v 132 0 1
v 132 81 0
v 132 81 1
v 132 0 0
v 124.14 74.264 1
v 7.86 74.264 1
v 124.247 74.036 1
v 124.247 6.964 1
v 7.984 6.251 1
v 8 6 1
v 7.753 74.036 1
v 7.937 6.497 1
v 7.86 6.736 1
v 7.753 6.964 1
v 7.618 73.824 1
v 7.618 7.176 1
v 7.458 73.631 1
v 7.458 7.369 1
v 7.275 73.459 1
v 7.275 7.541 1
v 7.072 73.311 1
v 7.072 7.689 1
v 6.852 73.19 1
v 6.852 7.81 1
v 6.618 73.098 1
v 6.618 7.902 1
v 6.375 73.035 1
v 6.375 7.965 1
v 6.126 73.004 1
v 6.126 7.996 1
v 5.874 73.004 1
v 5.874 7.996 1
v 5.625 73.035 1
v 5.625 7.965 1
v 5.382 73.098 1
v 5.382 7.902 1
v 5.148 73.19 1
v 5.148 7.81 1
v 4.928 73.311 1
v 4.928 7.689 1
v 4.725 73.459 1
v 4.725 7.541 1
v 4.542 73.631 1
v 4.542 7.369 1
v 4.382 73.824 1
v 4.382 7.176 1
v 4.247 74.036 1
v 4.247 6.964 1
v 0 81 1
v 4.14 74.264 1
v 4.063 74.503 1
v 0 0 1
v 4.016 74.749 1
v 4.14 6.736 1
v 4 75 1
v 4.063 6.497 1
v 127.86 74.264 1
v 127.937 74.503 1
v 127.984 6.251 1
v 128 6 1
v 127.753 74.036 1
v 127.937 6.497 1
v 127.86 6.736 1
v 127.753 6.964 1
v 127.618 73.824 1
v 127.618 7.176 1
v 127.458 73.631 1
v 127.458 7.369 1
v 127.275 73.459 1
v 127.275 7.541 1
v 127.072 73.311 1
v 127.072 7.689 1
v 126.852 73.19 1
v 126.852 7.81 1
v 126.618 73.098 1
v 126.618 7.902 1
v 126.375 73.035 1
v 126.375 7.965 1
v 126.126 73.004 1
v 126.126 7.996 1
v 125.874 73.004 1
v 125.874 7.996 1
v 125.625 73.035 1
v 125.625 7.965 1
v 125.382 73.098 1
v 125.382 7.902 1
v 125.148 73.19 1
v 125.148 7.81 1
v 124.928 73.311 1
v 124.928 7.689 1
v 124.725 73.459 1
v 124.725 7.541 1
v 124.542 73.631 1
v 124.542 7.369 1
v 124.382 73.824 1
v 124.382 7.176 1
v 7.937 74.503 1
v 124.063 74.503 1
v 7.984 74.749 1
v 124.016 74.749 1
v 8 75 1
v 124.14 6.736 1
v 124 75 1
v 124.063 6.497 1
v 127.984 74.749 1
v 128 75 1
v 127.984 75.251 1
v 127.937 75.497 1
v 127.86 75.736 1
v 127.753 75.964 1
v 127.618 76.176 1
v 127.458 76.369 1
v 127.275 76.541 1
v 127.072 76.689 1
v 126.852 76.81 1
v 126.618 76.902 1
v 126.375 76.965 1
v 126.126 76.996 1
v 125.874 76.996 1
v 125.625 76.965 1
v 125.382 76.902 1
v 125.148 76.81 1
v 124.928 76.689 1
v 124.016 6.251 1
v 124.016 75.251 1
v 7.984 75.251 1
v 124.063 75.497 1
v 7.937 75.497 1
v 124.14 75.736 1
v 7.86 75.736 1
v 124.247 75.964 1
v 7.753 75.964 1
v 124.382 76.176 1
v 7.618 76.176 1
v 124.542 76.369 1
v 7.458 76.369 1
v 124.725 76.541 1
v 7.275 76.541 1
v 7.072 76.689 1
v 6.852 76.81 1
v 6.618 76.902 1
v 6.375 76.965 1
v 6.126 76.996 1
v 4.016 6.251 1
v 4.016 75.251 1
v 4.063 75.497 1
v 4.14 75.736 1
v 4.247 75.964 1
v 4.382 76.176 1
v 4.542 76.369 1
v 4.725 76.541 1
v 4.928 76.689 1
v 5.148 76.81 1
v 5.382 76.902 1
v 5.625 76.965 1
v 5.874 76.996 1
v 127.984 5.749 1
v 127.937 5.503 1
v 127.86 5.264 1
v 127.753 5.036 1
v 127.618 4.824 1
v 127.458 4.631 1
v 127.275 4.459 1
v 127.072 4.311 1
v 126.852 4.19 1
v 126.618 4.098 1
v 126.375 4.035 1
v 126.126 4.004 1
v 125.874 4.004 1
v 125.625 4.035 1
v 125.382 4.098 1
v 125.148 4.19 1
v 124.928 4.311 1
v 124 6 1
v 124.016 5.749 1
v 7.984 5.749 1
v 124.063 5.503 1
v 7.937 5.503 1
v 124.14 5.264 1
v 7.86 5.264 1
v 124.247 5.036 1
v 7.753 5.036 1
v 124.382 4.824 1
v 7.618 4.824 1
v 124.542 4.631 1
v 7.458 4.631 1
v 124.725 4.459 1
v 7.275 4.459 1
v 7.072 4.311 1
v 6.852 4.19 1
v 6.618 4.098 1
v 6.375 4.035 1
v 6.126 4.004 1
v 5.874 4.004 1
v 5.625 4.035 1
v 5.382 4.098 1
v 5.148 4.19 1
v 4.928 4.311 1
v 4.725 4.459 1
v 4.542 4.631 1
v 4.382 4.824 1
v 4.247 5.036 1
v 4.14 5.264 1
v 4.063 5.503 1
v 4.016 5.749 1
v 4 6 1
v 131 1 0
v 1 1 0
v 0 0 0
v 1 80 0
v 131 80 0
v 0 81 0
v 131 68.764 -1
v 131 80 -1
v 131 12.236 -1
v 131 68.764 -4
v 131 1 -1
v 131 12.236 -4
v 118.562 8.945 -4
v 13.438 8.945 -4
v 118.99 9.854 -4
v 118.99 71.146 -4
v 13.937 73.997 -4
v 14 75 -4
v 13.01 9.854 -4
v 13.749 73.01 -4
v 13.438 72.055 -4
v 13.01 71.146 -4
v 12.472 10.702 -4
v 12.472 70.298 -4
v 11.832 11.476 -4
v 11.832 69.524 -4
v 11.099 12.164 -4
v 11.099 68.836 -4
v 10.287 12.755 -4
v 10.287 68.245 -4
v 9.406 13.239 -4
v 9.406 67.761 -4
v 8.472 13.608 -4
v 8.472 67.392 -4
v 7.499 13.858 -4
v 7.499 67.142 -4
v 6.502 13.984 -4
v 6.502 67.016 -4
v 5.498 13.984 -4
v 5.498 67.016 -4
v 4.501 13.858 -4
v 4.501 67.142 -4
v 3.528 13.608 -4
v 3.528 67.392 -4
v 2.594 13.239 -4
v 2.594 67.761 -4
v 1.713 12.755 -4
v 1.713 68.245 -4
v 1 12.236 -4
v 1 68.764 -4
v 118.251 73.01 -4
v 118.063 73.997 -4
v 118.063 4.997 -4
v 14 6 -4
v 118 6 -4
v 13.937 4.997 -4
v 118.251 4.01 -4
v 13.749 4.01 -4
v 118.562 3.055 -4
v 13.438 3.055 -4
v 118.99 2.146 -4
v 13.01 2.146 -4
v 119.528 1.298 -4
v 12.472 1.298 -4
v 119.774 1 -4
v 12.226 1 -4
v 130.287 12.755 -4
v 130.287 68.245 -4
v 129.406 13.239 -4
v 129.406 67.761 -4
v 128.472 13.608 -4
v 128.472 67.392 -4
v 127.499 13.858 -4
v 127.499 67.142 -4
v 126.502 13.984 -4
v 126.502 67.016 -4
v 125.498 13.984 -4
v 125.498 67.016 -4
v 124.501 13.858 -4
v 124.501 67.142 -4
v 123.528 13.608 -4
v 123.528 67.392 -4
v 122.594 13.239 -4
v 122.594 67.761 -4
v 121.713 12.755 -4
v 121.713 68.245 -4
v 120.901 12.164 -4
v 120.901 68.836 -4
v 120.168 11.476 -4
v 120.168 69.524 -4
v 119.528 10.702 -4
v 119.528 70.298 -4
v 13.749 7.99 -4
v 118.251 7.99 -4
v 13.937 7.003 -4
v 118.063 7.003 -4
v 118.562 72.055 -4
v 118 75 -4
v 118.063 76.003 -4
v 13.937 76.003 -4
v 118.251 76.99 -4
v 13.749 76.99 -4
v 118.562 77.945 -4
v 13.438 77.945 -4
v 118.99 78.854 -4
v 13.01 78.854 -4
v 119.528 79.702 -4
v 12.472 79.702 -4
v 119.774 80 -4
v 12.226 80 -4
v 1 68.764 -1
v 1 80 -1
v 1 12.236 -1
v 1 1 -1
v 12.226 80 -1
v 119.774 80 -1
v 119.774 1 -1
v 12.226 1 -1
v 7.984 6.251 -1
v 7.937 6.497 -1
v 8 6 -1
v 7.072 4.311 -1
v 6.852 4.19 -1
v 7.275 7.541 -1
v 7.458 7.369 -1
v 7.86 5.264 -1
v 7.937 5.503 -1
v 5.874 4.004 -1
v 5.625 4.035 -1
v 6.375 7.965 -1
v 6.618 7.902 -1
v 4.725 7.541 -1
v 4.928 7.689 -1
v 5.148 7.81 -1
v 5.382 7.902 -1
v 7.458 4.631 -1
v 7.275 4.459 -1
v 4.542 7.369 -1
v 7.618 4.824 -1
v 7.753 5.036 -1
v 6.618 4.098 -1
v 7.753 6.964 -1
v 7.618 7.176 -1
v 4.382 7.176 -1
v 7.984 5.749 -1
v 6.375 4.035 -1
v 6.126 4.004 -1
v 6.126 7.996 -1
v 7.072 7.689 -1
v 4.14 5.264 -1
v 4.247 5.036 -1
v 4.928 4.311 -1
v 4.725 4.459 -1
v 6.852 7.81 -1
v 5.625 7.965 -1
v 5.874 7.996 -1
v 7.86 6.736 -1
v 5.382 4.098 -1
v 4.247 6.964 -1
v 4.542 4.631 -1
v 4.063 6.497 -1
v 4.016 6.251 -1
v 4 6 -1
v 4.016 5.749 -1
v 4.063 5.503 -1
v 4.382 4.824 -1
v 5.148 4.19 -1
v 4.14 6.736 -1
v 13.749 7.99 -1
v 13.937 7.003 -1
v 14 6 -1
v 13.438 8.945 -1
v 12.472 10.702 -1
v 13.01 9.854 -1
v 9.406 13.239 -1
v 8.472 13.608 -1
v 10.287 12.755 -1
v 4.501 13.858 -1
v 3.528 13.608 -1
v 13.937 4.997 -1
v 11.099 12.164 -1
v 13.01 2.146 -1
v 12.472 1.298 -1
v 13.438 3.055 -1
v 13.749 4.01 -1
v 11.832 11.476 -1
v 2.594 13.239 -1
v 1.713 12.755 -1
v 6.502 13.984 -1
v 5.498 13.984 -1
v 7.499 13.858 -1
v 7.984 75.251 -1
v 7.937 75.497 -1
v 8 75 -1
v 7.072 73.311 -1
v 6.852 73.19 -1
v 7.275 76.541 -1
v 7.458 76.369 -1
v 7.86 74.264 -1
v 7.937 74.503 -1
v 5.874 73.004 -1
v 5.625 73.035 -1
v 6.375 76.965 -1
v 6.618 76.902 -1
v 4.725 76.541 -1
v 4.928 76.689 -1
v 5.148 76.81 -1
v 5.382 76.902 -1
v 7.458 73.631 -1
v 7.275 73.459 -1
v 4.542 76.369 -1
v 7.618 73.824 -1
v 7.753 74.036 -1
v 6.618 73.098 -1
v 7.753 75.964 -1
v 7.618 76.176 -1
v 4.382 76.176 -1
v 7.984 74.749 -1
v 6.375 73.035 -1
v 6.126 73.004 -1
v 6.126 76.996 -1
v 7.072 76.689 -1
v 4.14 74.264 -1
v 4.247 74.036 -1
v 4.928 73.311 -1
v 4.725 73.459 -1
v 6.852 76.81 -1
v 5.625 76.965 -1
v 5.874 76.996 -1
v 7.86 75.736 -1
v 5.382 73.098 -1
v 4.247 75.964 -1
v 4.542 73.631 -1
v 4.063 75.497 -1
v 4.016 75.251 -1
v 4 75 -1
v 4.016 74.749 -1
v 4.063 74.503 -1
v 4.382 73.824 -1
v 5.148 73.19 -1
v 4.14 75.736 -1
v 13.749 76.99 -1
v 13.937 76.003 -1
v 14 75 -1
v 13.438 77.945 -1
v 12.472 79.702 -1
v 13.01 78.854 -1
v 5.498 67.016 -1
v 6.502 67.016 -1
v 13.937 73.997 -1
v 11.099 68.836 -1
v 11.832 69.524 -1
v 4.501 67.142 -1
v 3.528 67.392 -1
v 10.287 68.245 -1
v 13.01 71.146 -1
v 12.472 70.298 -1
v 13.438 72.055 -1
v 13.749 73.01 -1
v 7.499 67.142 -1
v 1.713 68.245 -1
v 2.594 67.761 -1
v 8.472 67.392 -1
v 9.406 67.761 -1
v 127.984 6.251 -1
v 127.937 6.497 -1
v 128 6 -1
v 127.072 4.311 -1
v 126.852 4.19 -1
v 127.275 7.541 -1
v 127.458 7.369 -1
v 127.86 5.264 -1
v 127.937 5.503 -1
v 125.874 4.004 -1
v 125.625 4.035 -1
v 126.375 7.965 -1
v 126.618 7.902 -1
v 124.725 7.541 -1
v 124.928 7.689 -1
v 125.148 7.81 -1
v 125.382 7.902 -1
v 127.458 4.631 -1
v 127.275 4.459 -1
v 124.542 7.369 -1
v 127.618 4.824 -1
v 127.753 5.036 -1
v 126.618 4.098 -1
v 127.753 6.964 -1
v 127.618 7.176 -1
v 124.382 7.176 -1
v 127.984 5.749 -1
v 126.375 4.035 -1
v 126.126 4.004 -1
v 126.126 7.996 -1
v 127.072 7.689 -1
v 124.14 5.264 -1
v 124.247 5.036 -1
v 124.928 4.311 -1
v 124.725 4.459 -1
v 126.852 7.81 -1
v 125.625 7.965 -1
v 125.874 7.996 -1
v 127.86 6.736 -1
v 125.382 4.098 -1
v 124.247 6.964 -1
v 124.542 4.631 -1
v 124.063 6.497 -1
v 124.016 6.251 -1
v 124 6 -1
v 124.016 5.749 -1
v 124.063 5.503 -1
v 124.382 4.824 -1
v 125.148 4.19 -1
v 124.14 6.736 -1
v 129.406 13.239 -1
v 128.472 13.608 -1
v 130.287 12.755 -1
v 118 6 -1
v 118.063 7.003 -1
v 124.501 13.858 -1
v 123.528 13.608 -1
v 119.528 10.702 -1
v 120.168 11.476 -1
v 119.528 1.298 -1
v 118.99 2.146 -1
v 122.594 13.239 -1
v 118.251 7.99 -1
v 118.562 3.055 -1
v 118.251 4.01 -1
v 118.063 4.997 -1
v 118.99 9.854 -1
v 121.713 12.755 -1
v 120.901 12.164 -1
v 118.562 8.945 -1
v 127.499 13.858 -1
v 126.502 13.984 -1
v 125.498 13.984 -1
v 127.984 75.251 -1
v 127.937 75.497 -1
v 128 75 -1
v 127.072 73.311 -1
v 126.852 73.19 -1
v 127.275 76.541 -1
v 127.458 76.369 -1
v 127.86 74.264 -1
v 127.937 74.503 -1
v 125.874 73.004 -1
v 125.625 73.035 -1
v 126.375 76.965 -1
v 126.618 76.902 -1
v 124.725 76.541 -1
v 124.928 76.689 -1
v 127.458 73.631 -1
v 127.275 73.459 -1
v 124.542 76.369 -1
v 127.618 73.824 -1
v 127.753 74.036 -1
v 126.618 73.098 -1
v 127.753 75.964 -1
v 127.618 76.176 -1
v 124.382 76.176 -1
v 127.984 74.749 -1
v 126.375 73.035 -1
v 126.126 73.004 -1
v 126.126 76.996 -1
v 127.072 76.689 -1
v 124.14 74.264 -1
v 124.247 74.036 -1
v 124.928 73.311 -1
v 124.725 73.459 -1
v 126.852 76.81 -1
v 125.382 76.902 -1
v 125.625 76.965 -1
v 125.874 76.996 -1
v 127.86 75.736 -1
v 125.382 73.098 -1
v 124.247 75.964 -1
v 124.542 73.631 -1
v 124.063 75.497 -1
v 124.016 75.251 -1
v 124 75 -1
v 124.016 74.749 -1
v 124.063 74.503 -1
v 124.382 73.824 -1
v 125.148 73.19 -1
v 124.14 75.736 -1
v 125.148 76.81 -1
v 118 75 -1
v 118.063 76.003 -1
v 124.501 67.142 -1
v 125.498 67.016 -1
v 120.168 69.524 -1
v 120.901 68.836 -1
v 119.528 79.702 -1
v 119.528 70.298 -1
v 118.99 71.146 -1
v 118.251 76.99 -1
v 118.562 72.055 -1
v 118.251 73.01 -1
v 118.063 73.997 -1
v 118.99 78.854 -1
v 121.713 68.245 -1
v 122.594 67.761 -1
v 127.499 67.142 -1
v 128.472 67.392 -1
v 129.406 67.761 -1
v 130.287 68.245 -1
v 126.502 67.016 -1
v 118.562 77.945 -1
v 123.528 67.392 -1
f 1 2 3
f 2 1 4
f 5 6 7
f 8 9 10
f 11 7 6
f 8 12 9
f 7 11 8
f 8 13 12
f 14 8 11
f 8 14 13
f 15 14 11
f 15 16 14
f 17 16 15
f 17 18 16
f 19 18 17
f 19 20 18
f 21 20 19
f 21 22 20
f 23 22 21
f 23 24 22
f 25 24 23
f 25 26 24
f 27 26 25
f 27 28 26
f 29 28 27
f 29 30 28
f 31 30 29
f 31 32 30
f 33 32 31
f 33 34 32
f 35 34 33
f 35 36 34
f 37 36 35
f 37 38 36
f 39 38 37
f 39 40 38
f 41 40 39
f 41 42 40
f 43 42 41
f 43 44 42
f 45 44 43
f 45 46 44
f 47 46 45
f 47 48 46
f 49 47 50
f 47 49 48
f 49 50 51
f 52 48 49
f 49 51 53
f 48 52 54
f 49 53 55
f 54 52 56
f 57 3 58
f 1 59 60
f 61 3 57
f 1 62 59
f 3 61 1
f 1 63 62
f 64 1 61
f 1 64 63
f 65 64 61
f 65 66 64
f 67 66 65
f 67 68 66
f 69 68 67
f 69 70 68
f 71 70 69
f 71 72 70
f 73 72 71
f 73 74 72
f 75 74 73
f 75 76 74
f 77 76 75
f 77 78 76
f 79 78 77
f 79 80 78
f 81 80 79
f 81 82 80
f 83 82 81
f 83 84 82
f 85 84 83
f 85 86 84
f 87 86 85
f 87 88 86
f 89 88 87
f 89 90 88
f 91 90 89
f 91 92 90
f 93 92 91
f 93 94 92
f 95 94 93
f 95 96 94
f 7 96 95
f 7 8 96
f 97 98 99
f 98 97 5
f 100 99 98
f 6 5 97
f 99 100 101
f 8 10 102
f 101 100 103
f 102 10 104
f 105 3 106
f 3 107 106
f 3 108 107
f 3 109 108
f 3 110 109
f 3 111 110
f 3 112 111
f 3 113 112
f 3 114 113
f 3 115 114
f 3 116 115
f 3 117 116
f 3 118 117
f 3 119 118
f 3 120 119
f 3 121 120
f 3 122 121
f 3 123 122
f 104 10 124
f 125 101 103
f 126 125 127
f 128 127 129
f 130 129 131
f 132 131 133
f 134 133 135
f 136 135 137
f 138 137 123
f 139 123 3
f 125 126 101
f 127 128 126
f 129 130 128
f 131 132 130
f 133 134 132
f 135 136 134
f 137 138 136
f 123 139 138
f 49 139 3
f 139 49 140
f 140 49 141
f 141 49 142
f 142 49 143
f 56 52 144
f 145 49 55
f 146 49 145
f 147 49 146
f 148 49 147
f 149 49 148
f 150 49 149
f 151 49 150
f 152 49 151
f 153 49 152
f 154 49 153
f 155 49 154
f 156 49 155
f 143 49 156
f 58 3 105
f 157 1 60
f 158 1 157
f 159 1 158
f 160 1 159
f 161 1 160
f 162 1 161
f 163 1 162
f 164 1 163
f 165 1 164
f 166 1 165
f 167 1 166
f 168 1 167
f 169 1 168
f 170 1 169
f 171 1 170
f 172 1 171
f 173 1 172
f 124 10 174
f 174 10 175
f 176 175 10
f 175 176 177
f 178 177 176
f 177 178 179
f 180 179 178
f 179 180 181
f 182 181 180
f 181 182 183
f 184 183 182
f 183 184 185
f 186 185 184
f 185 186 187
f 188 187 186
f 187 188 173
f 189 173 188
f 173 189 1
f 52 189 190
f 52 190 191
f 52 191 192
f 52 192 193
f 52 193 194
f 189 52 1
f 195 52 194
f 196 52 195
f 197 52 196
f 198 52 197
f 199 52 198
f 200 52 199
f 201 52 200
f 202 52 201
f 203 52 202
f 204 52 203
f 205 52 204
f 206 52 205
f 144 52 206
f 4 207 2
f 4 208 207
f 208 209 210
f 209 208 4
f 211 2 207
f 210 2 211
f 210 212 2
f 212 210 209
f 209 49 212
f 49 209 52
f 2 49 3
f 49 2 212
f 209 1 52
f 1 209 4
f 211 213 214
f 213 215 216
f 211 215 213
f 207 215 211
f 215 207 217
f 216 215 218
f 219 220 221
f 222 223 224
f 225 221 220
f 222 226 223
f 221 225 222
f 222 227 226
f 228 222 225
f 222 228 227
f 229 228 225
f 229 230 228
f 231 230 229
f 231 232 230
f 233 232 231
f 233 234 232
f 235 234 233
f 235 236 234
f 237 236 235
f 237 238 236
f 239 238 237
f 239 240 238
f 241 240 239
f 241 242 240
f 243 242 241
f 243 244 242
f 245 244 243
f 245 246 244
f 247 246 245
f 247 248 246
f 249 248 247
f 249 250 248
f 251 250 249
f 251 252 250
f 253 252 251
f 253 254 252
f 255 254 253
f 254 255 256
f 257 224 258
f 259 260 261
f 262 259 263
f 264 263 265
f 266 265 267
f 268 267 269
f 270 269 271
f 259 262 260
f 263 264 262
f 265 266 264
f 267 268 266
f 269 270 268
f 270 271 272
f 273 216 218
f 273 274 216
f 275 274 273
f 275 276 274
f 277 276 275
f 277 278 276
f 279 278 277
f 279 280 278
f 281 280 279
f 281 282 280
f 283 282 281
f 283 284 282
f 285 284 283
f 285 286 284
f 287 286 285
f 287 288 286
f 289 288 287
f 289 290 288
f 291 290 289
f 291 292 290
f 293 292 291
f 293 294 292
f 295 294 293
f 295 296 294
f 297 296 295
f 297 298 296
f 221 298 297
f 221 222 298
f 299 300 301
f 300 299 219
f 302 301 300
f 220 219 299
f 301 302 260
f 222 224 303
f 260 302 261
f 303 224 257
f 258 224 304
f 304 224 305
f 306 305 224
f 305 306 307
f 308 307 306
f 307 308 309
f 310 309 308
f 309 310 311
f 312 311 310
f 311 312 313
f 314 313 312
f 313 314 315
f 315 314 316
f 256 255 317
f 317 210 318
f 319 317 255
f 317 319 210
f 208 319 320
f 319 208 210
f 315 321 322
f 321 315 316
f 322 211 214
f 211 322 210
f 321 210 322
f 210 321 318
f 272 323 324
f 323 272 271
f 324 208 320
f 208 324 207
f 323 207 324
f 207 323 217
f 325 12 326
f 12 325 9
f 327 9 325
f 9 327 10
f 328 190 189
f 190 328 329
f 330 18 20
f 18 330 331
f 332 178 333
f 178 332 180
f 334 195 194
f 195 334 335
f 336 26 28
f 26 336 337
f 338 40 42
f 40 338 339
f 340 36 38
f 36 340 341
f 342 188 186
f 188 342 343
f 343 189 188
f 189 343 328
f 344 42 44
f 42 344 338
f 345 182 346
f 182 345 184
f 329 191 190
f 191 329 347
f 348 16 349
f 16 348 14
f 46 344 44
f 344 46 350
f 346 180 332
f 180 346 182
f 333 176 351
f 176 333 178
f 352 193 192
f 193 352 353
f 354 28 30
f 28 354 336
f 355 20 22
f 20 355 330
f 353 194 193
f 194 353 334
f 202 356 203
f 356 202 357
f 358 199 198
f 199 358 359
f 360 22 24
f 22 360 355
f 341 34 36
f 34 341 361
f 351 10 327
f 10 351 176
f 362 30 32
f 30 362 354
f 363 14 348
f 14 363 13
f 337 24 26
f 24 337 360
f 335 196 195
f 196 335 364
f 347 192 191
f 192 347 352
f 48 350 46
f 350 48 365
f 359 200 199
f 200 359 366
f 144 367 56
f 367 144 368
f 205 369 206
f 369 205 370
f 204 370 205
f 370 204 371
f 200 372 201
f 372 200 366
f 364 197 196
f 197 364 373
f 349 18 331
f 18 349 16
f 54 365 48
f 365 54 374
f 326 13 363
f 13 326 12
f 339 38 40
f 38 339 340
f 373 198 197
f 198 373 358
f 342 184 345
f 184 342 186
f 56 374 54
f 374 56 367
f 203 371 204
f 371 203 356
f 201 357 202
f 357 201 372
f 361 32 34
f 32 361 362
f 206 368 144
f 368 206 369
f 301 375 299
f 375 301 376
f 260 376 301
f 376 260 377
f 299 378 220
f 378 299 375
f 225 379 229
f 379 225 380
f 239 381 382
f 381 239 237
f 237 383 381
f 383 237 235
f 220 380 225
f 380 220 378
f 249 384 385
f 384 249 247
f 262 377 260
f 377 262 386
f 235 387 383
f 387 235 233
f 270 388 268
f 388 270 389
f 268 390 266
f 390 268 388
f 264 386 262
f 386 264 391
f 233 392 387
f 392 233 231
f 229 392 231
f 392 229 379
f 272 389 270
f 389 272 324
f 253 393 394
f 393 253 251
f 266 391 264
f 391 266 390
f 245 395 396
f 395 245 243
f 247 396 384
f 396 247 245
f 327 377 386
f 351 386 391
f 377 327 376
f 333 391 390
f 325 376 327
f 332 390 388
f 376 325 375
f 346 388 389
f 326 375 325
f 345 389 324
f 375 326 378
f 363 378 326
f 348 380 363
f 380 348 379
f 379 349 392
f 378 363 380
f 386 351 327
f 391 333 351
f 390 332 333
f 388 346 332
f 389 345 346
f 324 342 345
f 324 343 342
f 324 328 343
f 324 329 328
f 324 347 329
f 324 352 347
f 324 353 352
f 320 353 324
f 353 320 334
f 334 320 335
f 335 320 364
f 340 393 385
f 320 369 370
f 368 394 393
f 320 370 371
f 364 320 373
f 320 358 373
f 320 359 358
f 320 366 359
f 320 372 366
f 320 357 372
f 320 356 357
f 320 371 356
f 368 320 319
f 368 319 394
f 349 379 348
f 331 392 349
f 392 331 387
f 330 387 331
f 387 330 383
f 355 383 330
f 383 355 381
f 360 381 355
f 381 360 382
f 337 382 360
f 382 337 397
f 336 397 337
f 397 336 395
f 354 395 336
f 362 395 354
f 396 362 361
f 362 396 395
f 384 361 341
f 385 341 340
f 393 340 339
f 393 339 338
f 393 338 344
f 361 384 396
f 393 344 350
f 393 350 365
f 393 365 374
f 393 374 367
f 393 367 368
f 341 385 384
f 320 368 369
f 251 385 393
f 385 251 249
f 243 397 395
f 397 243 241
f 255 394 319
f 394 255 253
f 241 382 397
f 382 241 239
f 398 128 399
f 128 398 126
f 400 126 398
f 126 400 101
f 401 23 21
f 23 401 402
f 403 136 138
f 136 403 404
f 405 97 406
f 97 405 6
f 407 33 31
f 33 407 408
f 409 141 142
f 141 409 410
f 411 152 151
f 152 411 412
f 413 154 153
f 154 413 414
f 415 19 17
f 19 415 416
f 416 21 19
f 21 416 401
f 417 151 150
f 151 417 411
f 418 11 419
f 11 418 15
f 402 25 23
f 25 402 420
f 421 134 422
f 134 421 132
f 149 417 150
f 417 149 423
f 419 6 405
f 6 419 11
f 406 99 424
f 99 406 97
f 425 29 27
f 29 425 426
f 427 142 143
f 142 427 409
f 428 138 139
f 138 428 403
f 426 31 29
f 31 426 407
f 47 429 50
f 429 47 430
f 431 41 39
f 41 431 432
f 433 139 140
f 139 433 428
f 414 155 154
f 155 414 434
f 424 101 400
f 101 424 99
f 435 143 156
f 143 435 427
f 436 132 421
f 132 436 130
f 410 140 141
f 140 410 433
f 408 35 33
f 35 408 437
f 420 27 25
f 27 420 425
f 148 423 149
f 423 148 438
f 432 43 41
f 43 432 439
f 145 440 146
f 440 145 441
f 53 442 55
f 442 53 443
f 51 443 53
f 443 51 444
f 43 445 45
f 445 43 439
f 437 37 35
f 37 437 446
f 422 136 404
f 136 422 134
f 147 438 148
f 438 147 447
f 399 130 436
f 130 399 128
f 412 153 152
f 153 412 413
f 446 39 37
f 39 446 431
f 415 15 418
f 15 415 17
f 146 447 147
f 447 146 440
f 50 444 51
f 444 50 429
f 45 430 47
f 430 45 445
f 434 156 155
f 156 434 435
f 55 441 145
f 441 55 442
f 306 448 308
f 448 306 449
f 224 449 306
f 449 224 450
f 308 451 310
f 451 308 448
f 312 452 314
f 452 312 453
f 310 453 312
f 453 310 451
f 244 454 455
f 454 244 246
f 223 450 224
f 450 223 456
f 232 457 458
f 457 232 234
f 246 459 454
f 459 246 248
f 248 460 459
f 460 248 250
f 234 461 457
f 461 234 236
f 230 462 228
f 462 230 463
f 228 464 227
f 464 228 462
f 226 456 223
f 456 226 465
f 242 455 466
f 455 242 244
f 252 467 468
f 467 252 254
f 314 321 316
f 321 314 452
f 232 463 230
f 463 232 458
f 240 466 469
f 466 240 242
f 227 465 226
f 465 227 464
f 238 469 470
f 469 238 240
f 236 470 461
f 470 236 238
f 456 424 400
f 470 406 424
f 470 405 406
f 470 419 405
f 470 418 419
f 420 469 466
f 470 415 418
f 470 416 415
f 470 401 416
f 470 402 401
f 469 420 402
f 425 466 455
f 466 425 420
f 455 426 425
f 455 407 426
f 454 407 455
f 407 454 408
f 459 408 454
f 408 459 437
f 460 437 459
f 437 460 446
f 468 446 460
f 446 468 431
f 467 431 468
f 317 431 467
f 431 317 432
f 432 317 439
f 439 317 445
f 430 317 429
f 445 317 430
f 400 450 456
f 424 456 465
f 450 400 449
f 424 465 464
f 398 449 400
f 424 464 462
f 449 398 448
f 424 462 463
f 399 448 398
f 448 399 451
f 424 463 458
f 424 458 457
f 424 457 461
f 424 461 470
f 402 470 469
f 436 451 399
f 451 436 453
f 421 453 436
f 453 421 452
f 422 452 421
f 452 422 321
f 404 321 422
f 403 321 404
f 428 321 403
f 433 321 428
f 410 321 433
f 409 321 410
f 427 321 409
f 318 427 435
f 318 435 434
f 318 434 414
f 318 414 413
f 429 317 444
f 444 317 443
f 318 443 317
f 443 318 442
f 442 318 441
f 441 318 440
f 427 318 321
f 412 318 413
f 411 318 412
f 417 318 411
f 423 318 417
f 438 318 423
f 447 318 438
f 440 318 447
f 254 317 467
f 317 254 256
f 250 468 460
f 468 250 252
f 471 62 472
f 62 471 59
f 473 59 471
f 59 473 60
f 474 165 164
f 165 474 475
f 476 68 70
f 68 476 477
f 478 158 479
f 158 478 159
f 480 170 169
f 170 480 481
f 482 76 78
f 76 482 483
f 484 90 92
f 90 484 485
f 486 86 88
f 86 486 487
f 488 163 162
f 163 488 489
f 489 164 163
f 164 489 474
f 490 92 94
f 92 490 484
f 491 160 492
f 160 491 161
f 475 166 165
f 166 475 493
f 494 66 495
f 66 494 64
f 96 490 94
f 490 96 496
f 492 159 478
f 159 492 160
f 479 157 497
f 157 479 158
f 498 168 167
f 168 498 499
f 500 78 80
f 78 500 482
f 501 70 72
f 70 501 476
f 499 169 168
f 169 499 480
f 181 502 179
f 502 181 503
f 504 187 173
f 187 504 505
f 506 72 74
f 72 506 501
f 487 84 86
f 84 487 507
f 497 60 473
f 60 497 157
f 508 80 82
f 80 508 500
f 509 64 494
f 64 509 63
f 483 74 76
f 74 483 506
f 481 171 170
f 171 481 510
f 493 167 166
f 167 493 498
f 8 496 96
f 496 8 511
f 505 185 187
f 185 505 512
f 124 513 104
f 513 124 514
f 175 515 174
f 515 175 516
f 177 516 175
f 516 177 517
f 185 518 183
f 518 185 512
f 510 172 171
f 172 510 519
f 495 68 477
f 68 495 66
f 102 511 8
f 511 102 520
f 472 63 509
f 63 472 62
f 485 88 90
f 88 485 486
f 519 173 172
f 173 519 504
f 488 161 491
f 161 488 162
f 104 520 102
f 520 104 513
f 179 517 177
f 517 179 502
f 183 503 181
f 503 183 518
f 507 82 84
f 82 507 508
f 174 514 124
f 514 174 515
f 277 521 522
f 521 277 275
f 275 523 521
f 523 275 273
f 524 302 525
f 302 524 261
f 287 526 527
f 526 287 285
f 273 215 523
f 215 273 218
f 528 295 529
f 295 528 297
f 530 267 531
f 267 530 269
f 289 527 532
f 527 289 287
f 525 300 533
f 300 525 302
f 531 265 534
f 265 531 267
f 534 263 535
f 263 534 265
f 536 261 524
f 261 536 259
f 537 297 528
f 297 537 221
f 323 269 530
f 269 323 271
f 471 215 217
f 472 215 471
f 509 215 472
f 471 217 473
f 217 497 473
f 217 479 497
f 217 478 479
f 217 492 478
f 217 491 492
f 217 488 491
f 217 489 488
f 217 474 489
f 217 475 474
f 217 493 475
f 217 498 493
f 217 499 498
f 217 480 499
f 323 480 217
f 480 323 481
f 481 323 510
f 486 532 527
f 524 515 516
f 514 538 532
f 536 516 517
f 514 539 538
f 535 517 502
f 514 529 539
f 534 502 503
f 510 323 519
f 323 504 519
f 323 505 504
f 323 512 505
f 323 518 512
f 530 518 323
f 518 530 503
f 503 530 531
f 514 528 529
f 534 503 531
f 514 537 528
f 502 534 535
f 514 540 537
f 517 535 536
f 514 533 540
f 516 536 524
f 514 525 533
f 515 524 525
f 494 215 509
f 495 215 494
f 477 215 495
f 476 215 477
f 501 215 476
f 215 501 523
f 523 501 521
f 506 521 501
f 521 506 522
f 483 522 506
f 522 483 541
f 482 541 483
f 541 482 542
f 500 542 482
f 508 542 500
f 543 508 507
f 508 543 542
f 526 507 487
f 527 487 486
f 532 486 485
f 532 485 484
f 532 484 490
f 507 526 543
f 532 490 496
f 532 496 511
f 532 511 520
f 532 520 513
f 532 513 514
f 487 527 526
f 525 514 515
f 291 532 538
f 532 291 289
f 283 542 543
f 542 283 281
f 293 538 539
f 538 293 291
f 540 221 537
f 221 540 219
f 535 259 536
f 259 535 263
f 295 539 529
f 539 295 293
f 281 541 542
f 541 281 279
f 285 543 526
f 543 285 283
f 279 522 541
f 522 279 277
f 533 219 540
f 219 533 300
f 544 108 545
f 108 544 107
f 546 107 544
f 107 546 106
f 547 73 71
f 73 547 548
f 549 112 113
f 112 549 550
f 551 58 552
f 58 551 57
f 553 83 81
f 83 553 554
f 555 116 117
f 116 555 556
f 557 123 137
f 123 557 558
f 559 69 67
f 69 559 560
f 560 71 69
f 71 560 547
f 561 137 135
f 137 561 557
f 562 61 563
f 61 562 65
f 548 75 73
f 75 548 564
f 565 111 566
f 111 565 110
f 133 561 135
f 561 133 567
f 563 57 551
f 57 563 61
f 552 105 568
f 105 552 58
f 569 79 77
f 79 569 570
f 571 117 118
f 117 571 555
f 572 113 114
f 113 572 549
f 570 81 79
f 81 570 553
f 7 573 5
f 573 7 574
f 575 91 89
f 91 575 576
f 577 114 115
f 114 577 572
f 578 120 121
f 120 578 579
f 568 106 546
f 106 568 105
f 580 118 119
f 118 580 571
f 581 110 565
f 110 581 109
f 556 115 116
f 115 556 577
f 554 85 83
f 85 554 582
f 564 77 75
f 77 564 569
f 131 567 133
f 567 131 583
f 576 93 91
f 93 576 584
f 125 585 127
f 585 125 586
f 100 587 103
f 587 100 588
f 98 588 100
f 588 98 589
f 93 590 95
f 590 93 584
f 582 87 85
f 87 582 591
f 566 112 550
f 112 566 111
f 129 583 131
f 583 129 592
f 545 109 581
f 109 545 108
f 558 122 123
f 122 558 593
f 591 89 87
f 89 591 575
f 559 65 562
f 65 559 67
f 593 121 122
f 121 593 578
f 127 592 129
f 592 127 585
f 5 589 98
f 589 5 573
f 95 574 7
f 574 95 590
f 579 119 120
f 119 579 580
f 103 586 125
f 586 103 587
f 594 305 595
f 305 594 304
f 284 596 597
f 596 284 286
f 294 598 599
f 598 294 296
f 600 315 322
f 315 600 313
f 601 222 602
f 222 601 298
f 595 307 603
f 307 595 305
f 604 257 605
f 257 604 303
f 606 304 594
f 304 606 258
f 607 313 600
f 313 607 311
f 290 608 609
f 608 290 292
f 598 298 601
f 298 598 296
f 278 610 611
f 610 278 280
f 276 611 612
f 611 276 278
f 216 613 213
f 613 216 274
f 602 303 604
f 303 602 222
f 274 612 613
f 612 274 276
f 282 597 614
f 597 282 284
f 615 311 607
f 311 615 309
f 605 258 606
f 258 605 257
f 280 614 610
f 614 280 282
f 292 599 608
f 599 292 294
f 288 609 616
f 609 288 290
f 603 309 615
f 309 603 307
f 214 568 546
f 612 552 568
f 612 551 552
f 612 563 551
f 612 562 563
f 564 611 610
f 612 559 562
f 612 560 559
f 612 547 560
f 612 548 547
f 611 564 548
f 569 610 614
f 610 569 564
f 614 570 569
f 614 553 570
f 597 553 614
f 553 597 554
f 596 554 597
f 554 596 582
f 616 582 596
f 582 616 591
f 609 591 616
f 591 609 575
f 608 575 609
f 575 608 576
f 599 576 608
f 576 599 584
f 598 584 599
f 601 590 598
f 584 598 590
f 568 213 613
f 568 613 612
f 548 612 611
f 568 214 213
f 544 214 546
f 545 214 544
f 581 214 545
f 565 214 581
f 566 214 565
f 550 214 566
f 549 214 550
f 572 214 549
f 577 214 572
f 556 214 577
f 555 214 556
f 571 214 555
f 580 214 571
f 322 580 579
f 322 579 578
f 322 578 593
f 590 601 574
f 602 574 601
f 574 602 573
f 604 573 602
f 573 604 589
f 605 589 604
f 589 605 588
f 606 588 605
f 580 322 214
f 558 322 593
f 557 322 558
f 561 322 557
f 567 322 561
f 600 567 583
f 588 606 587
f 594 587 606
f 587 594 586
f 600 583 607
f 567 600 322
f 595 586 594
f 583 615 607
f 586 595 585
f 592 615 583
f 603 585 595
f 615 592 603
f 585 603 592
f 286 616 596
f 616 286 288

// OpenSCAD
// All measurements in mm.

// The model is built with the top upwards so
// that you can more easily position holes and
// such. Make sure to flip it over for printing.

// The width of the lid.
width = 132;

// The height of the lid.
height = 81;

// The distance to place screw holes from the left/right edge.
x_hole_distance = 6;

// The distance to place screw holes from the top/bottom edge.
y_hole_distance = 6;

$fn = 50 * 1;

difference() {
    
    union() {
        cube([width, height, 1]);
        translate([1, 1, -4]) {
            cube([width - 2, height - 2, 4]);
        }
    }

    translate([x_hole_distance, y_hole_distance, 0]) {
        cylinder(100, 2, 2, true);
    }
    translate([x_hole_distance, y_hole_distance, -51]) {
        cylinder(100, 8, 8, true);
    }
    
    translate([x_hole_distance, height - y_hole_distance, 0]) {
        cylinder(100, 2, 2, true);
    }
    translate([x_hole_distance, height - y_hole_distance, -51]) {
        cylinder(100, 8, 8, true);
    }
    
    translate([width - x_hole_distance, y_hole_distance, 0]) {
        cylinder(100, 2, 2, true);
    }
    translate([width - x_hole_distance, y_hole_distance, -51]) {
        cylinder(100, 8, 8, true);
    }

    translate([width - x_hole_distance, height - y_hole_distance, 0]) {
        cylinder(100, 2, 2, true);
    }
    translate([width - x_hole_distance, height - y_hole_distance, -51]) {
        cylinder(100, 8, 8, true);
    }

 }
